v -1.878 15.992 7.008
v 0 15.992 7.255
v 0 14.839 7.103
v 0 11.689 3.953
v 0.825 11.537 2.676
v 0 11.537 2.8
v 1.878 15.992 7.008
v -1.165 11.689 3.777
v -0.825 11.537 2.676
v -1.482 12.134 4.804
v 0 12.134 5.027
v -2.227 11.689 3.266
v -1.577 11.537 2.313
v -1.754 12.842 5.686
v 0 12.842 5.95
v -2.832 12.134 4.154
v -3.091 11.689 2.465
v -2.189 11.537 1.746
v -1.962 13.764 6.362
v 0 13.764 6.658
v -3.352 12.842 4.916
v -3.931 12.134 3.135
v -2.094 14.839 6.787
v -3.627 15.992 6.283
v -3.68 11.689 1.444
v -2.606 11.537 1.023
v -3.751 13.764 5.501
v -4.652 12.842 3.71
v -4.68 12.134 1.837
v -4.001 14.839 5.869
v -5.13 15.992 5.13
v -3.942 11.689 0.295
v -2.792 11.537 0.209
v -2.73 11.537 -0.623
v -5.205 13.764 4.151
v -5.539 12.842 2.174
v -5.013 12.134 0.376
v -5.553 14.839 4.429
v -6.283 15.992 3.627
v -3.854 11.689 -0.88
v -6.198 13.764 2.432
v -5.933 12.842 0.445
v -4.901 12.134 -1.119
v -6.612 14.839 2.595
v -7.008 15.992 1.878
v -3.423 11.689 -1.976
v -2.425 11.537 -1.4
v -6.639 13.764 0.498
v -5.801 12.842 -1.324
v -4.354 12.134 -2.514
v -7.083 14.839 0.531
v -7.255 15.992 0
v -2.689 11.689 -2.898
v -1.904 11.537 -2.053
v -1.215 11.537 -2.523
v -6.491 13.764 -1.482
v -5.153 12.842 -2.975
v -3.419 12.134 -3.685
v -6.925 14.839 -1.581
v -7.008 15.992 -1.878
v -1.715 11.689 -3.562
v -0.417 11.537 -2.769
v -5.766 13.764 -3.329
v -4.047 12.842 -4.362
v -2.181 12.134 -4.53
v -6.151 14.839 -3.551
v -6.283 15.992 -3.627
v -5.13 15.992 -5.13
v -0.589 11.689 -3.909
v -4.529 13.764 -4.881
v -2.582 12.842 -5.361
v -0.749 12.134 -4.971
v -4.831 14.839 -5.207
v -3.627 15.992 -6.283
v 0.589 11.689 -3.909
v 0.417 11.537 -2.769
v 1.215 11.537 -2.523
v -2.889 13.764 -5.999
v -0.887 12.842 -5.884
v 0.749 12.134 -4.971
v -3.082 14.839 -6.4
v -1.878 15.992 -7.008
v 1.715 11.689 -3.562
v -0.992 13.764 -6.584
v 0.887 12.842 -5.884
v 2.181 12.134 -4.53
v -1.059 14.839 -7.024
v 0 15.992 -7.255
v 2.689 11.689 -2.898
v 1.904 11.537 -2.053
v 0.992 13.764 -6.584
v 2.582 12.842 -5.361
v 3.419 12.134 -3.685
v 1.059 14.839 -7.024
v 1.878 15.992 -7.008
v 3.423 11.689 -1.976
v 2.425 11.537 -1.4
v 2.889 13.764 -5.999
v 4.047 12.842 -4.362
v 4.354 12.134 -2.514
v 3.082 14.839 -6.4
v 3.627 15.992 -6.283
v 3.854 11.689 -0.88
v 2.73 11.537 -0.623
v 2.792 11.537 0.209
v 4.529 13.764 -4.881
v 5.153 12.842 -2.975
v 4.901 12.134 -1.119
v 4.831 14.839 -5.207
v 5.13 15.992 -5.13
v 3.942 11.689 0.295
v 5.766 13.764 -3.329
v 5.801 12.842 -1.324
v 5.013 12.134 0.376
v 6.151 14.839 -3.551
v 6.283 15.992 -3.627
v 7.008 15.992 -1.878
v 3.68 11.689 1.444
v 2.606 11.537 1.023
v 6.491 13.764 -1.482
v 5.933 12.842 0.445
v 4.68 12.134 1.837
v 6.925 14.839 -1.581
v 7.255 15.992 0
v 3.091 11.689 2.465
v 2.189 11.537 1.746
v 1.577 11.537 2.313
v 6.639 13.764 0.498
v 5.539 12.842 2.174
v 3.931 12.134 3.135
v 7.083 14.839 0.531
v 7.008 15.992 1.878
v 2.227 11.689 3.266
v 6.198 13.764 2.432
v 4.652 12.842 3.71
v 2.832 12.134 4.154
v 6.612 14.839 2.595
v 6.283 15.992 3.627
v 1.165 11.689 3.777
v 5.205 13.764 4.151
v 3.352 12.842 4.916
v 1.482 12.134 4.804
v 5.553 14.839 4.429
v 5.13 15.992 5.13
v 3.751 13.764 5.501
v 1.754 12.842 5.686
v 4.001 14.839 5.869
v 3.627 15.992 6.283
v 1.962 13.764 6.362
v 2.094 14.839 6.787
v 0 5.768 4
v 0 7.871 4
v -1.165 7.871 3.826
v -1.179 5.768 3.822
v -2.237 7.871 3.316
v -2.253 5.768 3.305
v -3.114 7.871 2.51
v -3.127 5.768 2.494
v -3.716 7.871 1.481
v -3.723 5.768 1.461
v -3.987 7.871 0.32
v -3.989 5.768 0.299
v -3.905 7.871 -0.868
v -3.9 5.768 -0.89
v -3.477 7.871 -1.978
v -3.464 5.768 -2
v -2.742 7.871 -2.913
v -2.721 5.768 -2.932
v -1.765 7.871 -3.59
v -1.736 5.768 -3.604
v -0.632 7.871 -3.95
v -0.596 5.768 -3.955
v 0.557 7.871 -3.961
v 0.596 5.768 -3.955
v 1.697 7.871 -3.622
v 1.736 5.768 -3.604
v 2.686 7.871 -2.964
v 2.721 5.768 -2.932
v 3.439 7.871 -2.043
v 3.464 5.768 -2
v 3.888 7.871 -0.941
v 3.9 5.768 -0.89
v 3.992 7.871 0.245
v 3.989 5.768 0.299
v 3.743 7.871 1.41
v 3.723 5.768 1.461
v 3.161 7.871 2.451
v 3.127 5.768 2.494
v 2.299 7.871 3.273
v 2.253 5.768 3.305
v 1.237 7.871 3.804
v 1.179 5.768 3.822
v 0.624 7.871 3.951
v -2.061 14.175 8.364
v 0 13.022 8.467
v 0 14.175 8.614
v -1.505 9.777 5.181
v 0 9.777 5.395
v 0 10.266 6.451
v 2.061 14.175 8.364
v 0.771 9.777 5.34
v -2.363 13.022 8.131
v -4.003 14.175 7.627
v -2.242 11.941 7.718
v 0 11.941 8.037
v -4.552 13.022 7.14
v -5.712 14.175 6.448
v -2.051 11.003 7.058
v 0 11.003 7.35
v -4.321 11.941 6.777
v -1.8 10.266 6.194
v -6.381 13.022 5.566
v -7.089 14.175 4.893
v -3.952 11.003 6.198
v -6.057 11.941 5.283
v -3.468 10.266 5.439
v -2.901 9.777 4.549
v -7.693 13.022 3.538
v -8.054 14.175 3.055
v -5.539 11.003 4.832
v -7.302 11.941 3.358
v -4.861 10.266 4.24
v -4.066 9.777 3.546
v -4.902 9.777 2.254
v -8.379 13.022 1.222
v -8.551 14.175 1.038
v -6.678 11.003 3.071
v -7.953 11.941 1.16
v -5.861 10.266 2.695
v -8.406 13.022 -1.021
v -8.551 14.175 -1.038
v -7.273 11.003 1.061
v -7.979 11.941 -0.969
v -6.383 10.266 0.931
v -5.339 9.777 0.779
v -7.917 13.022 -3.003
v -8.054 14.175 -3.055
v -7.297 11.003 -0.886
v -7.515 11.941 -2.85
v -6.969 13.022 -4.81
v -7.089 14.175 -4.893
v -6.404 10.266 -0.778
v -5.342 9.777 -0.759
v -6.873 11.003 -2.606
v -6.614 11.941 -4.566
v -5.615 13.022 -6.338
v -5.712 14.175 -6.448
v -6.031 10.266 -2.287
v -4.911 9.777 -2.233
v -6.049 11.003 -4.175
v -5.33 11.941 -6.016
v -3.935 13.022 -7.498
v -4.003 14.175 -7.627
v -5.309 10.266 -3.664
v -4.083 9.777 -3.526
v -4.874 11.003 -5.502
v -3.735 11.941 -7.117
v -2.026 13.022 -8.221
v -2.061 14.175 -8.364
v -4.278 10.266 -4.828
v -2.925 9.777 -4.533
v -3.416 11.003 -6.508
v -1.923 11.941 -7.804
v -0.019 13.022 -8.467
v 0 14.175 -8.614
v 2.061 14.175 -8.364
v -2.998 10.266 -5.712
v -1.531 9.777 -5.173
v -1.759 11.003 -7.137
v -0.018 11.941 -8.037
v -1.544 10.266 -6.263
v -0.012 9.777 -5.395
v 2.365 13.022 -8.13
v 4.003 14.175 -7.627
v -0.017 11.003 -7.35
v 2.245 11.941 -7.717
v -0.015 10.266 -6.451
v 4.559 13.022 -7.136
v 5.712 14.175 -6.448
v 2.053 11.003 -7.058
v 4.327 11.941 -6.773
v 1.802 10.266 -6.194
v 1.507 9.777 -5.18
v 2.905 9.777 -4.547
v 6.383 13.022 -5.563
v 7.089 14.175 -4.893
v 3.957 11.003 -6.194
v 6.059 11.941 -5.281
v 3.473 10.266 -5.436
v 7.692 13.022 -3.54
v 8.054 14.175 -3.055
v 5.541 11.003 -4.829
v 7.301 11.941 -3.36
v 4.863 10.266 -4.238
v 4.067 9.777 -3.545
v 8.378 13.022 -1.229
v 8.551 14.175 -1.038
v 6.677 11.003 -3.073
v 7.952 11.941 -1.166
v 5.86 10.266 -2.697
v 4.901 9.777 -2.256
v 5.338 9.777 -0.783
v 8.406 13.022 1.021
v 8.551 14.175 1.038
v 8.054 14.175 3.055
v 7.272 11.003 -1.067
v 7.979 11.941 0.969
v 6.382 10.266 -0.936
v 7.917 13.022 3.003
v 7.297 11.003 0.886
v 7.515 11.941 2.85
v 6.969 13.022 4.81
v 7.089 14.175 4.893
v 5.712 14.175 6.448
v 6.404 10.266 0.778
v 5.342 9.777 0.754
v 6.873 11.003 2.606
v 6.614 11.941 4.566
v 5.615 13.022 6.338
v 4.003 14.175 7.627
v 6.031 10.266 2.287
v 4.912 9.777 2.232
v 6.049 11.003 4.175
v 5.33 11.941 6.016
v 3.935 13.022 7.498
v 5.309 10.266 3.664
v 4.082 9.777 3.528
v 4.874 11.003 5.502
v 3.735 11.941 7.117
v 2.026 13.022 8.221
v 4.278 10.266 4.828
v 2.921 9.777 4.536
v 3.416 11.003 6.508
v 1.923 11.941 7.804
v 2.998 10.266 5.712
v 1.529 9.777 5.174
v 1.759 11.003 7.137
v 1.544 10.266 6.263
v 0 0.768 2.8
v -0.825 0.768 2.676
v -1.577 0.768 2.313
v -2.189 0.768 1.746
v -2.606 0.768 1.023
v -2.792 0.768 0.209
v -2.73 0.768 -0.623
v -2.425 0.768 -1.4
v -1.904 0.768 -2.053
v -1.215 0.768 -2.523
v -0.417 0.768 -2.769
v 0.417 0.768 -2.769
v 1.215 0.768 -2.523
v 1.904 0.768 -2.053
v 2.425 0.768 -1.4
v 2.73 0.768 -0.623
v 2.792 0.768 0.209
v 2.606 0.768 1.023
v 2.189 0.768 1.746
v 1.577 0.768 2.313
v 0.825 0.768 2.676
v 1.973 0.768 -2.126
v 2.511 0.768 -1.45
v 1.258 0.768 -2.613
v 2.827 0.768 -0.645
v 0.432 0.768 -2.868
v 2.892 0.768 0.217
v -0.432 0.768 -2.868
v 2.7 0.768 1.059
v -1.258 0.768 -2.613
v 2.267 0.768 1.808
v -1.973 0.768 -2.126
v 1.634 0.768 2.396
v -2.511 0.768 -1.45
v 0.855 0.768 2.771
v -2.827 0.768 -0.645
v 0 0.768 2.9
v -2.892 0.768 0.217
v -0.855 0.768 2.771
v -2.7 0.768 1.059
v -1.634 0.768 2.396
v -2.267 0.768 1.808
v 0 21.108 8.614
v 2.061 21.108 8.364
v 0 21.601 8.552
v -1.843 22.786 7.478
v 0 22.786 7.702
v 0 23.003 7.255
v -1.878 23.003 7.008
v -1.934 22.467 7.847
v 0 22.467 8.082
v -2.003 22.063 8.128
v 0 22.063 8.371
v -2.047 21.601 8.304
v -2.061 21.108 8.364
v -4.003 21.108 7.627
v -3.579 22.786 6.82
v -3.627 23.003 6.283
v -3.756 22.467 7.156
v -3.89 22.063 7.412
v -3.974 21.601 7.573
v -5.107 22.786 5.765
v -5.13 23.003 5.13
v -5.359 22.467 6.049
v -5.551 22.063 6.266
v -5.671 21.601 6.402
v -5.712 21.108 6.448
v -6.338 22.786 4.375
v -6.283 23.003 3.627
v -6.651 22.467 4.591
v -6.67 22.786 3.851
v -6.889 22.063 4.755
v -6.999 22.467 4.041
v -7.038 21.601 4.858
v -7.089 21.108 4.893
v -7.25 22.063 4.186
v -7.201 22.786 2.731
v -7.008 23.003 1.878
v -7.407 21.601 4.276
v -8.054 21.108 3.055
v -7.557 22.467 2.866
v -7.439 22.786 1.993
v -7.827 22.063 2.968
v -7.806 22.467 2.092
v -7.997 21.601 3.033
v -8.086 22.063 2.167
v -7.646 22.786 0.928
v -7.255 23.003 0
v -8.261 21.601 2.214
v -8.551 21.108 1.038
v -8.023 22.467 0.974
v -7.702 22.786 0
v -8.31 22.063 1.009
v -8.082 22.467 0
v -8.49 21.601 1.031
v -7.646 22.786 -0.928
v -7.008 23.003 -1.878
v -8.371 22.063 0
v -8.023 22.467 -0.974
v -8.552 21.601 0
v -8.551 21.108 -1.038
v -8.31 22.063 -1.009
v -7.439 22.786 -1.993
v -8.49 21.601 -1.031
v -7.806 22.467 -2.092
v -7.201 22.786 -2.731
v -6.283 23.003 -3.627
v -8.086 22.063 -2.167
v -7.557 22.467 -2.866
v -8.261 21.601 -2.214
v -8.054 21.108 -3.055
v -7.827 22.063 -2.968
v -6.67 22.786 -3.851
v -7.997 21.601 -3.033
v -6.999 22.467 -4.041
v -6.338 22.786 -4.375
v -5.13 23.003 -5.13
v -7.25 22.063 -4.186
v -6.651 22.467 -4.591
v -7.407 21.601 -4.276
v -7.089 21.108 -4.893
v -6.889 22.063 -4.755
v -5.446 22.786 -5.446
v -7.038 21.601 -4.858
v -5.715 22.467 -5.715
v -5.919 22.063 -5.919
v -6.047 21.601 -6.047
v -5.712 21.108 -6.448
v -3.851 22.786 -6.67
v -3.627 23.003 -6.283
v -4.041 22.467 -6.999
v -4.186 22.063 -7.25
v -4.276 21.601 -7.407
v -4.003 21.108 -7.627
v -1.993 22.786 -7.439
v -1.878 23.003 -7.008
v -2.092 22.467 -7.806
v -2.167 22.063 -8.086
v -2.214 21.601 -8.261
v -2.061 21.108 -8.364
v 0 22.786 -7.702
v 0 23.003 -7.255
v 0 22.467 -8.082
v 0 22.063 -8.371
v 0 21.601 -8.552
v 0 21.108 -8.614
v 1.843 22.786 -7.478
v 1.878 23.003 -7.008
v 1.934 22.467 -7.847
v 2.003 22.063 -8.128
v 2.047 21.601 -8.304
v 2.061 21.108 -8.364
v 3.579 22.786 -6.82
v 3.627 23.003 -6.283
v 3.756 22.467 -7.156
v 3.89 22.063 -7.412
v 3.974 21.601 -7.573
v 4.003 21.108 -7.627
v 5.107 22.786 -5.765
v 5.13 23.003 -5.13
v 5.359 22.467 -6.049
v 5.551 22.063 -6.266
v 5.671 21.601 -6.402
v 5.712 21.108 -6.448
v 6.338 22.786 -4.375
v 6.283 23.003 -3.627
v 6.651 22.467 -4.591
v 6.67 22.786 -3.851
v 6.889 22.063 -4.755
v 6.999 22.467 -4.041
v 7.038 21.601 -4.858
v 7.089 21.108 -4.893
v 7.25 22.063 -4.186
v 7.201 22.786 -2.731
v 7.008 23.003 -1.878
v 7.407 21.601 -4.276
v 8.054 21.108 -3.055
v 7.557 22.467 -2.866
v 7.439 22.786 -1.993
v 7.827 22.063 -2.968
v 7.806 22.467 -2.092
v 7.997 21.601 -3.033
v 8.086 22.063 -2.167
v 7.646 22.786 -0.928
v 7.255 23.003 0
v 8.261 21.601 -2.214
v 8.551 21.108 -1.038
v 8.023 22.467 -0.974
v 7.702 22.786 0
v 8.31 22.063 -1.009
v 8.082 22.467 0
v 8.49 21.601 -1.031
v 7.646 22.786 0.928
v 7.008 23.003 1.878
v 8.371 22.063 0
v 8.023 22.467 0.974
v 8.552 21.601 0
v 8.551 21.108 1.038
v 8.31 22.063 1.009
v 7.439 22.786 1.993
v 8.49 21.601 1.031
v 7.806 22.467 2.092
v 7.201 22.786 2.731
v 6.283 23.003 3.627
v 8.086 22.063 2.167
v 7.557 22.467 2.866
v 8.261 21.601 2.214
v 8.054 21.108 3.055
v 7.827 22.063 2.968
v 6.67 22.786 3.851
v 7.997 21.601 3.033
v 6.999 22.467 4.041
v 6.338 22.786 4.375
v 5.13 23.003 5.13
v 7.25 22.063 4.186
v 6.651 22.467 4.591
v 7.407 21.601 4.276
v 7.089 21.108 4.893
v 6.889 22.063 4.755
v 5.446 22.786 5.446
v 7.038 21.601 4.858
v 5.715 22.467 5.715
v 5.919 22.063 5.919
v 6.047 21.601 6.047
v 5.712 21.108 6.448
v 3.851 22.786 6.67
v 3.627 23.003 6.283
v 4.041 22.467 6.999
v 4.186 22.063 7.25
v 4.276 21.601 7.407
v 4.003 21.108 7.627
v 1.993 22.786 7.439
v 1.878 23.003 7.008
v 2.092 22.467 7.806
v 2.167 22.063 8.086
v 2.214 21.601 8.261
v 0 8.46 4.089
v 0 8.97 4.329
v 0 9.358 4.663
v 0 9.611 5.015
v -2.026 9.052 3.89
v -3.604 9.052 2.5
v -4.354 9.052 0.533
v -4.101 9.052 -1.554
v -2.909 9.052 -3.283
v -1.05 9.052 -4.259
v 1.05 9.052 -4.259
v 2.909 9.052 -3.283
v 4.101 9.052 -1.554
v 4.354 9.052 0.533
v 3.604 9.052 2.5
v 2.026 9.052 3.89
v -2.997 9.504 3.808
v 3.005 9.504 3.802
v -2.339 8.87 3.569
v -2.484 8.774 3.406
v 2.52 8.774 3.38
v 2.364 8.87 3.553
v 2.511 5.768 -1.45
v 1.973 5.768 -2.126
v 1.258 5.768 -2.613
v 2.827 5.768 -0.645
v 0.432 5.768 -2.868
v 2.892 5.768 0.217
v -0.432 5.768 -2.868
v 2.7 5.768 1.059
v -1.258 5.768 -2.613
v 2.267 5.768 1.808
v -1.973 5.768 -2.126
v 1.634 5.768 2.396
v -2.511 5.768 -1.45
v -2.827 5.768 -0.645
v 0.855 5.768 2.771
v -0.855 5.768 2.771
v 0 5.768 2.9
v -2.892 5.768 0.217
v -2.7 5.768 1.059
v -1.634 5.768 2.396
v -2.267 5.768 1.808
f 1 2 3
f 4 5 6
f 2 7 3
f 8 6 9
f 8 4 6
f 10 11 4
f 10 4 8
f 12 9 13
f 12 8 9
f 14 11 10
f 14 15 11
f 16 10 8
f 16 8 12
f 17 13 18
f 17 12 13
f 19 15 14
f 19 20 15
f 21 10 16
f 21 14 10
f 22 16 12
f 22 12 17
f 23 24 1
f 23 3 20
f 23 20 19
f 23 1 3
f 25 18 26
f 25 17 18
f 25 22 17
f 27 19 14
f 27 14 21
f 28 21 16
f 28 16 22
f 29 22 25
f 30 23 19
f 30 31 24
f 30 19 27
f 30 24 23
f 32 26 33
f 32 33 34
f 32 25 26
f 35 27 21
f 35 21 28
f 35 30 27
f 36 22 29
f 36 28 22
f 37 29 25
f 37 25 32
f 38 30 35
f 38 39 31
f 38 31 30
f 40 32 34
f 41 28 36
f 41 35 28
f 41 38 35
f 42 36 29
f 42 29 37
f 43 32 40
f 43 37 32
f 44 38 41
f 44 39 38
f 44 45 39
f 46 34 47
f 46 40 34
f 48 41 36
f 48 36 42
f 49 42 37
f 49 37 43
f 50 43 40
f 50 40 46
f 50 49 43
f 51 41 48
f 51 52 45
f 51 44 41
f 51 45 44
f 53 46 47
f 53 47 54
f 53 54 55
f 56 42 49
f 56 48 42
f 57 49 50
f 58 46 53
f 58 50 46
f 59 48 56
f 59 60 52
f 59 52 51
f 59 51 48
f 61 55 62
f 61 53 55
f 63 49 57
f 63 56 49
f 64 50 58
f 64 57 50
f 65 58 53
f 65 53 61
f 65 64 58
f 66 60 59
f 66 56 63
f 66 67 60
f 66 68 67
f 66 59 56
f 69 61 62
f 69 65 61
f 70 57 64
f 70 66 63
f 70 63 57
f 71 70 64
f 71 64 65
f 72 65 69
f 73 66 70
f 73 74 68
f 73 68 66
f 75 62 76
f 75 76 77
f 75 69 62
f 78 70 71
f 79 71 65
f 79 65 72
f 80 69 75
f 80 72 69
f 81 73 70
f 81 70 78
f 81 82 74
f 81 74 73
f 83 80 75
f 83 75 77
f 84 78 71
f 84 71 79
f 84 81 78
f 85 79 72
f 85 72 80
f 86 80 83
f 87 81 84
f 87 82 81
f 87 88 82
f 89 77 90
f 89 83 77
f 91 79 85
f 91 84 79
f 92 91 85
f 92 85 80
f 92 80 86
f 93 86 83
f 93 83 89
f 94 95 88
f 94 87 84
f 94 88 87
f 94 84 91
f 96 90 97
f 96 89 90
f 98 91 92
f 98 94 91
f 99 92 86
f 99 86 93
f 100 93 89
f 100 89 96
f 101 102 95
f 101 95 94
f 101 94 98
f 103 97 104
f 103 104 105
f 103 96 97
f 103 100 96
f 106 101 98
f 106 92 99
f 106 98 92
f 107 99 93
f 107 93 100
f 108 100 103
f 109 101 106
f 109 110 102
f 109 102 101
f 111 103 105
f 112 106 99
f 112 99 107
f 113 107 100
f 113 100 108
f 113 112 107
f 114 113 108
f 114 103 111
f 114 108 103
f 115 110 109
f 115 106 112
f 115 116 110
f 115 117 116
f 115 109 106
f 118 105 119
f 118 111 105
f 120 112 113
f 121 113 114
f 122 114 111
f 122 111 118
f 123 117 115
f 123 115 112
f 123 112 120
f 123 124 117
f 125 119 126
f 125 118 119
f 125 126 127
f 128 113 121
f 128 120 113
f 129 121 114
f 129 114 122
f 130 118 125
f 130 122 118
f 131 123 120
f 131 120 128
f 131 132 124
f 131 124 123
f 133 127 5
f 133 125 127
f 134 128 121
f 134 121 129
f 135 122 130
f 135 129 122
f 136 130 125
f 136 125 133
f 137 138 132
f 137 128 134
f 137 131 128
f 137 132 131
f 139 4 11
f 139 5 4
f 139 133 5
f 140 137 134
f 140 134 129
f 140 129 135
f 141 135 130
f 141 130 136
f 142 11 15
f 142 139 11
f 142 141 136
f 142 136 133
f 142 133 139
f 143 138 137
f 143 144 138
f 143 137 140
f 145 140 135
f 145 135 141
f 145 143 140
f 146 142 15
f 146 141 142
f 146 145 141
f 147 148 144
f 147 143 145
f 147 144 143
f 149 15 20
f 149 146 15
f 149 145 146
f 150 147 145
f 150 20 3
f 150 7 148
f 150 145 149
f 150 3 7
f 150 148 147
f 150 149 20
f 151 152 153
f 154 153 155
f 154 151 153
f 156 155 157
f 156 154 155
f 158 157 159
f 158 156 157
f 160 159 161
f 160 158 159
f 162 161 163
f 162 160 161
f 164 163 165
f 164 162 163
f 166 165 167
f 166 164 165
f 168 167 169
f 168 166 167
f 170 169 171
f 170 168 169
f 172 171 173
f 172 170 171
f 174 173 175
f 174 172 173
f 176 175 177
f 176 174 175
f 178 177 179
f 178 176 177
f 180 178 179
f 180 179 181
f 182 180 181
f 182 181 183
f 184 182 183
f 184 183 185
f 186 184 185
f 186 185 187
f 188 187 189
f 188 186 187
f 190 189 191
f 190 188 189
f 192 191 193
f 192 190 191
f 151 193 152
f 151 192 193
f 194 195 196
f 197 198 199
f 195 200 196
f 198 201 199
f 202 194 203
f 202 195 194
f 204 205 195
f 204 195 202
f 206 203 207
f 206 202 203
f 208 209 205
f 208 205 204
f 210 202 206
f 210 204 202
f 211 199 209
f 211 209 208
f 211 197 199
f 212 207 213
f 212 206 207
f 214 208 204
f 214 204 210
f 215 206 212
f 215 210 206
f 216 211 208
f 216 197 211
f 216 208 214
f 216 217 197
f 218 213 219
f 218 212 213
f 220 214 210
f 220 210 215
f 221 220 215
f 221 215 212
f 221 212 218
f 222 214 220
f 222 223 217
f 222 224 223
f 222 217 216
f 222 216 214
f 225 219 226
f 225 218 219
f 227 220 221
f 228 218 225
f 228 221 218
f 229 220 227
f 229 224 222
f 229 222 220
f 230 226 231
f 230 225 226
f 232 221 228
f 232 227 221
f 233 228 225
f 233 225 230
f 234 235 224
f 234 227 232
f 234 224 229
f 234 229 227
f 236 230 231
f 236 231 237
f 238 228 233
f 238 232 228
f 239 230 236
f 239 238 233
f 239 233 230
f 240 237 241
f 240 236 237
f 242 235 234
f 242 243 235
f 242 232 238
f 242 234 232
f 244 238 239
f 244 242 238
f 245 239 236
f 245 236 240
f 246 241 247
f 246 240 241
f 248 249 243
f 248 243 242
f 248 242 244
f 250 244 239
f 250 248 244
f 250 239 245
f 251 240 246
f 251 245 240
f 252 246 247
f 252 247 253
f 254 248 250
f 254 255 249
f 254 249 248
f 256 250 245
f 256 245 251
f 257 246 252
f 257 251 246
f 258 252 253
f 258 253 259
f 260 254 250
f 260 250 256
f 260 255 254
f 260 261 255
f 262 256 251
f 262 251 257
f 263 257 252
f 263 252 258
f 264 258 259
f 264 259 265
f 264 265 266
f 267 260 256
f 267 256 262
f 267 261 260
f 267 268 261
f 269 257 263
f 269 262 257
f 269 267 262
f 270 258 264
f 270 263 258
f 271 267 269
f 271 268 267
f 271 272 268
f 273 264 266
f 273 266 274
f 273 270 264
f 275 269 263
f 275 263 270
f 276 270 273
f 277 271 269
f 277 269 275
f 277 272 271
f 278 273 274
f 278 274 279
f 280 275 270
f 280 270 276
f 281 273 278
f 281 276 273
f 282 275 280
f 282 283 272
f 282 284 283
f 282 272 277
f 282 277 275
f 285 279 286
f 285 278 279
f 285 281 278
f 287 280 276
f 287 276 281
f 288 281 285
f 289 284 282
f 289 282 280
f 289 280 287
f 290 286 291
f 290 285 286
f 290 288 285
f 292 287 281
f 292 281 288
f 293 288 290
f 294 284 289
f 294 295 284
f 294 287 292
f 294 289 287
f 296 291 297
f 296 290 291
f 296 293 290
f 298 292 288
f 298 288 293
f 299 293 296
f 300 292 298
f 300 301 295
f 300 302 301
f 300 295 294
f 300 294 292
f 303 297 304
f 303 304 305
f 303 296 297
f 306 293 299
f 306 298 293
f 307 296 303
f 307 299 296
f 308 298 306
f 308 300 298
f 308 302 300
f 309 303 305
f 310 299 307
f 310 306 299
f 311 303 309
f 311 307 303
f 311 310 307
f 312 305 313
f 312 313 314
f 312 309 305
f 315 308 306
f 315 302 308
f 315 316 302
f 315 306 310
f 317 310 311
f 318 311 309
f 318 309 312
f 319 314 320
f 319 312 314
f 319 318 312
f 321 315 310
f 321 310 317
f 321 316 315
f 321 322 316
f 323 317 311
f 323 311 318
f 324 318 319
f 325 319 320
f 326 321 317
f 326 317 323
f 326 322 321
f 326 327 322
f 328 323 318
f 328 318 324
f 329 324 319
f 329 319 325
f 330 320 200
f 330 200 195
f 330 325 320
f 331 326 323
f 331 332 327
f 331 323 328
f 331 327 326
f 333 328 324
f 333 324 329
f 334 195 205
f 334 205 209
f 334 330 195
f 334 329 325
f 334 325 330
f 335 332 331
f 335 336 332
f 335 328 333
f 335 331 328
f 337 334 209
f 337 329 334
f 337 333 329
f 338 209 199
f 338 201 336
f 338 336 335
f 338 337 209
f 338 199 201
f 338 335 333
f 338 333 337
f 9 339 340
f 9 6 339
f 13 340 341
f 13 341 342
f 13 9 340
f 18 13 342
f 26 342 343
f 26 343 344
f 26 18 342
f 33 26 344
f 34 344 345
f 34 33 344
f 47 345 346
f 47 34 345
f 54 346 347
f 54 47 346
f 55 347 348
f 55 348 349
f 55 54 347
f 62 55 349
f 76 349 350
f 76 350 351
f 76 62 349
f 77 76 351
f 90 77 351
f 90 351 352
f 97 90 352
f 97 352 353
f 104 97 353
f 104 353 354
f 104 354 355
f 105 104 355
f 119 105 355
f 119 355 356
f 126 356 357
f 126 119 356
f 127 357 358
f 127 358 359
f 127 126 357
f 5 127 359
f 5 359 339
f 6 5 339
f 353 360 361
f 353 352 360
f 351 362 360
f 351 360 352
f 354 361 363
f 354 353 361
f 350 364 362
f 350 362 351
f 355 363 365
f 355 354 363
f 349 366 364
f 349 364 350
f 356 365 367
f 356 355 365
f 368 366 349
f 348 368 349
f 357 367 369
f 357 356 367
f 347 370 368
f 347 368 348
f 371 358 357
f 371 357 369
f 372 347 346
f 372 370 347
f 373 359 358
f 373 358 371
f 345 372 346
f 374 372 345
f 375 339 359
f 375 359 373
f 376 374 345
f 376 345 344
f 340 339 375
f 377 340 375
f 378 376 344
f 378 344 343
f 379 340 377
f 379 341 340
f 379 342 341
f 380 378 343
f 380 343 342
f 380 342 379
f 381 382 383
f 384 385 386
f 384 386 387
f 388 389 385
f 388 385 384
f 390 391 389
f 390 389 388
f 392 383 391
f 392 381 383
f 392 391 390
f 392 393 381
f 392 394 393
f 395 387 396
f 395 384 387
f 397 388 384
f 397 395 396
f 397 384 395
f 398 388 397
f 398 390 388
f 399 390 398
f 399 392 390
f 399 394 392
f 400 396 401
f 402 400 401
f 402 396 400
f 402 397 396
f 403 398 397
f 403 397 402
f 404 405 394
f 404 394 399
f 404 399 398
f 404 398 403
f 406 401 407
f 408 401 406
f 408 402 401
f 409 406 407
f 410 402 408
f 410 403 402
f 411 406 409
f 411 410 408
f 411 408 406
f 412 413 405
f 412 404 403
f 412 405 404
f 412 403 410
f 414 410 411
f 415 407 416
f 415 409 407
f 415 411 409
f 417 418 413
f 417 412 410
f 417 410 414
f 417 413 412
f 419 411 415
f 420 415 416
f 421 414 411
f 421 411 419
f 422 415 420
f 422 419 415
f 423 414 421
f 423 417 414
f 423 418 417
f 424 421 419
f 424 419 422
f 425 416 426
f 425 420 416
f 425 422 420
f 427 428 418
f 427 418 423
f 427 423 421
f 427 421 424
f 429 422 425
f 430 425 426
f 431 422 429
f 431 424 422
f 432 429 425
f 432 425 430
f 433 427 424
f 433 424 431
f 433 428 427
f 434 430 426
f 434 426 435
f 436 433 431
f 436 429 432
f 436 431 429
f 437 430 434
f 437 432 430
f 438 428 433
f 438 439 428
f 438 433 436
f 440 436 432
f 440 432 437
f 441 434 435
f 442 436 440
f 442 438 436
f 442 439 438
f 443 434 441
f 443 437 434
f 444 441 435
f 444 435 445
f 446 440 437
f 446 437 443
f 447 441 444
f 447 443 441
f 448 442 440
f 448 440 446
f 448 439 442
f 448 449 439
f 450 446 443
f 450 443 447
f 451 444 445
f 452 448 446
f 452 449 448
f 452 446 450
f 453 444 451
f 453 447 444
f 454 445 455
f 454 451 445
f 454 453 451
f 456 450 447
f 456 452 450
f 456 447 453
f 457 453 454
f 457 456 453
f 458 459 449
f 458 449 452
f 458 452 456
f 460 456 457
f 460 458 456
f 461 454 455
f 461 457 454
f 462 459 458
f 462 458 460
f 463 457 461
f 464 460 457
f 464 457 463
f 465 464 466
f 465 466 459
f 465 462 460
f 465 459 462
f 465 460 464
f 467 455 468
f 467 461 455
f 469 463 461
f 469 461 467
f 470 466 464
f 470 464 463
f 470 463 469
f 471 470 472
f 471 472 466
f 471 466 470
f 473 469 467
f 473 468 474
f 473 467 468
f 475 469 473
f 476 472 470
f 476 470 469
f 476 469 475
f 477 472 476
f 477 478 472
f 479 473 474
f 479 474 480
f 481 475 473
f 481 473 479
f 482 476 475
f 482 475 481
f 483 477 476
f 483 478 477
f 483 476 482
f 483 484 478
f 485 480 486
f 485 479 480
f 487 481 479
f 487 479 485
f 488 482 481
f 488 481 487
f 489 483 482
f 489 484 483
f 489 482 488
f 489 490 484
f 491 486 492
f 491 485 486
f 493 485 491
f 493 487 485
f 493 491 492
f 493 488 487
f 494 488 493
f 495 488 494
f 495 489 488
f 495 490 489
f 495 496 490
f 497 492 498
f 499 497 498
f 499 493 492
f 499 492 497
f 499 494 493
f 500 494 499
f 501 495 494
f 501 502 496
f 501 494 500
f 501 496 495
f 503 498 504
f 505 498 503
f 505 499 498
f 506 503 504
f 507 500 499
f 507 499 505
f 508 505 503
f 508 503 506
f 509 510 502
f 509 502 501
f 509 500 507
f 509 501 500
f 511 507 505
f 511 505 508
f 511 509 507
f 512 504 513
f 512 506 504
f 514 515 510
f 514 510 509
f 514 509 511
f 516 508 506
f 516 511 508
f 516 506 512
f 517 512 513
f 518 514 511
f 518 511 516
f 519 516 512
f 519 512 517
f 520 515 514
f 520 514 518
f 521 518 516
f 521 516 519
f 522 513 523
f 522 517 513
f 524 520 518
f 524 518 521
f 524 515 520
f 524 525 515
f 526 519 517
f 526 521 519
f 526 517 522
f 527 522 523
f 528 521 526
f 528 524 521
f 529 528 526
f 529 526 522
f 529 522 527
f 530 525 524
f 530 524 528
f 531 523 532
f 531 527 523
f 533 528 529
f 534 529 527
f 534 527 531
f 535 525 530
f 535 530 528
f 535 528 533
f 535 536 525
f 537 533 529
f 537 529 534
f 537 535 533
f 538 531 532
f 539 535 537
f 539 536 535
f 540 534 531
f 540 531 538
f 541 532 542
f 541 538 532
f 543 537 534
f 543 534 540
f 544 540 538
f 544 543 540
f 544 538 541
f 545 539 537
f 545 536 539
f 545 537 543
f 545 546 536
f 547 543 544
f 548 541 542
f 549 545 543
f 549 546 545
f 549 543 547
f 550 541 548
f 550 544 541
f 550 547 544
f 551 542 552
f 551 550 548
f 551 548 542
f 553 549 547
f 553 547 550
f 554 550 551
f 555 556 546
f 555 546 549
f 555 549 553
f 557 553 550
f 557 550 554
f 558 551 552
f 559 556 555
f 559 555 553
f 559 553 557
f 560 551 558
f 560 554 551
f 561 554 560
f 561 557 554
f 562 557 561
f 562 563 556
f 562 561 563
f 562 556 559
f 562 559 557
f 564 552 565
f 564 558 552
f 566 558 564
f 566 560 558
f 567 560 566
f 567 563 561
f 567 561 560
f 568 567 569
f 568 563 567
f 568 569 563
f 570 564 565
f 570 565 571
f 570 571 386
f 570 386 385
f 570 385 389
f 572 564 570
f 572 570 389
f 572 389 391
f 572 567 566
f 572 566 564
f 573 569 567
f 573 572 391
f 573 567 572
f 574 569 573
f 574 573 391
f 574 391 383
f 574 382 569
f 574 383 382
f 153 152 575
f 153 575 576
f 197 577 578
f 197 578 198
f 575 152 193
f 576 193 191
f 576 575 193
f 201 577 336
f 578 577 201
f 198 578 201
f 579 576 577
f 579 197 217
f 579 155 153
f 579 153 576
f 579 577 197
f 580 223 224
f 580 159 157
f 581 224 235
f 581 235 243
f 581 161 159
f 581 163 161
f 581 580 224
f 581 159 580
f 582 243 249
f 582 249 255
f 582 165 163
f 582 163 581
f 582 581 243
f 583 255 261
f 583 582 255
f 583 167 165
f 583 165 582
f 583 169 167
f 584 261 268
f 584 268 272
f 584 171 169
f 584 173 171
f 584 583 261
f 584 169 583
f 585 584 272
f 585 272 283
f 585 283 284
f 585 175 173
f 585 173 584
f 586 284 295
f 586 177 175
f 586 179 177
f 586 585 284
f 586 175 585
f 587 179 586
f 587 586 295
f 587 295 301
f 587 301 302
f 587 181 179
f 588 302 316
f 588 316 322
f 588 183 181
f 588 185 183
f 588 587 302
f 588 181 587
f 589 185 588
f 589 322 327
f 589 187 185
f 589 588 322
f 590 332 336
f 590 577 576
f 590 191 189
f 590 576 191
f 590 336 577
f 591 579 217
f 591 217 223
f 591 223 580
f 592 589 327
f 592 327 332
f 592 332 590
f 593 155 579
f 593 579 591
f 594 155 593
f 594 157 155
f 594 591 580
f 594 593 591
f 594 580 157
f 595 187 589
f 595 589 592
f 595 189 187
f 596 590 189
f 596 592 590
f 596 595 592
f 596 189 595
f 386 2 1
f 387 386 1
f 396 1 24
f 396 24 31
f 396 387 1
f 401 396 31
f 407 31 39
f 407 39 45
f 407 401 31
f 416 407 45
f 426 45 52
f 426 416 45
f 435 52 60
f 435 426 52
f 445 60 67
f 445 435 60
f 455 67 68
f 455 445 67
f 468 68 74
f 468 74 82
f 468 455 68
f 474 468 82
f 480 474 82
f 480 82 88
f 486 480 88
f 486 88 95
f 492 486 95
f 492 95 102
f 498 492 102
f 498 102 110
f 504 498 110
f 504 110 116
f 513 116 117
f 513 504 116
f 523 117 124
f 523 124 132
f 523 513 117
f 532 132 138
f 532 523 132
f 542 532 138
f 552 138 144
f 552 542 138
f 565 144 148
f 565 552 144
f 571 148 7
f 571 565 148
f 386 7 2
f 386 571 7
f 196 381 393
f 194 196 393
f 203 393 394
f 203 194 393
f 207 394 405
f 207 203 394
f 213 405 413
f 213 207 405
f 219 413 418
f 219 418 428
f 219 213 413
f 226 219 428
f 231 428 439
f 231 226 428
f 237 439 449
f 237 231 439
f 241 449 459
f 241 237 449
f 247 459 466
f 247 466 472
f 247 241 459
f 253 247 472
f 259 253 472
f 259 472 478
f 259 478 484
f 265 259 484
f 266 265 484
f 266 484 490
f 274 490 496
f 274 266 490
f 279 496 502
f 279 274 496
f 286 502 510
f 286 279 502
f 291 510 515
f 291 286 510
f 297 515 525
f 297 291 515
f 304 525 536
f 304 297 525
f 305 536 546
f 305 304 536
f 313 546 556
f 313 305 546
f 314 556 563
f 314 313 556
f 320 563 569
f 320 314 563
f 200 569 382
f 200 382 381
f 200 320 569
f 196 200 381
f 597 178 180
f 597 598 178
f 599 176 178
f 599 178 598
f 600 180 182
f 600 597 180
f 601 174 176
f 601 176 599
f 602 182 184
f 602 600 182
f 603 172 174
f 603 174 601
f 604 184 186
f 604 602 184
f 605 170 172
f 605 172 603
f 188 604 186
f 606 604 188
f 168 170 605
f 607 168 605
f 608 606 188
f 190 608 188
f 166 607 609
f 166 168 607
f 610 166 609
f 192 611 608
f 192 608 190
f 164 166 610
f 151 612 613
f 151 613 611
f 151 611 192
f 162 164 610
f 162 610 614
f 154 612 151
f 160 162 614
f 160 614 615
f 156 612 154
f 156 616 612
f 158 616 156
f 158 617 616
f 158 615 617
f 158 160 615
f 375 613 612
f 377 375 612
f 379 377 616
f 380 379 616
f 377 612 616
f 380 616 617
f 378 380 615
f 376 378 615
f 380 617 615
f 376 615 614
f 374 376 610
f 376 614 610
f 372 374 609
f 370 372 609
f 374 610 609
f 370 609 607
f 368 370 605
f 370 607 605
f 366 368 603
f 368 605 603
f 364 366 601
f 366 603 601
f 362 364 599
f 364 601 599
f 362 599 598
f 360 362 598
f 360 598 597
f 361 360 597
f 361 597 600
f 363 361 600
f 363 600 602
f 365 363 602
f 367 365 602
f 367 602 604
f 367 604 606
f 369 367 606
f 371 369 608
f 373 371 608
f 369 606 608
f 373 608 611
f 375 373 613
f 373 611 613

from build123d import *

# Parameters (mm, degrees)
FILLET2_R           = 2
FILLET5_R           = 2
SKETCH4_R           = 2.9
SKETCH4_R_2         = 2.8
BOSS_EXTRUDE1_DEPTH = 5


with BuildPart() as part:
    # Sketch1 → Revolve1 (revolve)
    with BuildSketch(Plane.XY, mode=Mode.PRIVATE) as revolve1_sk:
        with BuildLine():
            Line((2.8, 5.768459657), (2.8, 11.536919315))
            ThreePointArc((2.8, 11.536919315), (5.949994158, 12.841689616), (7.254764459, 15.991683774))
            Line((7.254764459, 15.991683774), (7.254764459, 23.002625948))
            Line((7.254764459, 23.002625948), (8.614040085, 23.002625948))
            Line((8.614040085, 23.002625948), (8.614040085, 14.175242604))
            ThreePointArc((8.614040085, 14.175242604), (7.262619033, 10.912623572), (4, 9.56120252))
            Line((4, 9.56120252), (4, 5.768459657))
            Line((4, 5.768459657), (2.8, 5.768459657))
        make_face()
    revolve(revolve1_sk.sketch.rotate(Axis((0, 81.429038173, 0), (0, -1, 0)), 90), axis=Axis((0, 81.429038173, 0), (0, -1, 0)))

    # Fillet2
    # the kernel refuses this fillet: 2 mm, written as the material it takes off along each edge
    with BuildSketch(Plane(origin=(0, 23.002625948, 0), x_dir=(0, 0, 1), z_dir=(1, 0, 0))) as fillet2_piece_1:
        with BuildLine():
            CenterArc((6.614040085, 1.894590266), FILLET2_R, 288.684829844, 71.315170156)
            Line((8.614040085, 1.894590266), (8.654040085, 1.894590266))
            Line((8.654040085, 1.894590266), (8.654040085, 0))
            Line((8.654040085, 0), (8.614040085, -0.04))
            ThreePointArc((8.614040085, -0.04), (7.934402272, -0.04), (7.267578947, -0.037891805))
            Line((7.267578947, -0.037891805), (7.254764459, 0))
        make_face()
    revolve(axis=Axis((0, 23.002625948, 0), (0, -1, 0)), mode=Mode.SUBTRACT)

    # Fillet5
    fillet5_edges = [part.edges().sort_by_distance(p)[0] for p in [
        (0, 9.56120252, -4),
    ]]
    fillet(fillet5_edges, radius=FILLET5_R)

    # Sketch4 → Boss-Extrude1 (add)
    with BuildSketch(Plane.XZ.offset(-5.768459657)):
        with Locations(Location((0, 0, 0), (0, 0, 90))):
            Circle(SKETCH4_R)
        with Locations(Location((0, 0, 0), (0, 0, 90))):
            Circle(SKETCH4_R_2, mode=Mode.SUBTRACT)
    extrude(amount=BOSS_EXTRUDE1_DEPTH)


solid = part.part
